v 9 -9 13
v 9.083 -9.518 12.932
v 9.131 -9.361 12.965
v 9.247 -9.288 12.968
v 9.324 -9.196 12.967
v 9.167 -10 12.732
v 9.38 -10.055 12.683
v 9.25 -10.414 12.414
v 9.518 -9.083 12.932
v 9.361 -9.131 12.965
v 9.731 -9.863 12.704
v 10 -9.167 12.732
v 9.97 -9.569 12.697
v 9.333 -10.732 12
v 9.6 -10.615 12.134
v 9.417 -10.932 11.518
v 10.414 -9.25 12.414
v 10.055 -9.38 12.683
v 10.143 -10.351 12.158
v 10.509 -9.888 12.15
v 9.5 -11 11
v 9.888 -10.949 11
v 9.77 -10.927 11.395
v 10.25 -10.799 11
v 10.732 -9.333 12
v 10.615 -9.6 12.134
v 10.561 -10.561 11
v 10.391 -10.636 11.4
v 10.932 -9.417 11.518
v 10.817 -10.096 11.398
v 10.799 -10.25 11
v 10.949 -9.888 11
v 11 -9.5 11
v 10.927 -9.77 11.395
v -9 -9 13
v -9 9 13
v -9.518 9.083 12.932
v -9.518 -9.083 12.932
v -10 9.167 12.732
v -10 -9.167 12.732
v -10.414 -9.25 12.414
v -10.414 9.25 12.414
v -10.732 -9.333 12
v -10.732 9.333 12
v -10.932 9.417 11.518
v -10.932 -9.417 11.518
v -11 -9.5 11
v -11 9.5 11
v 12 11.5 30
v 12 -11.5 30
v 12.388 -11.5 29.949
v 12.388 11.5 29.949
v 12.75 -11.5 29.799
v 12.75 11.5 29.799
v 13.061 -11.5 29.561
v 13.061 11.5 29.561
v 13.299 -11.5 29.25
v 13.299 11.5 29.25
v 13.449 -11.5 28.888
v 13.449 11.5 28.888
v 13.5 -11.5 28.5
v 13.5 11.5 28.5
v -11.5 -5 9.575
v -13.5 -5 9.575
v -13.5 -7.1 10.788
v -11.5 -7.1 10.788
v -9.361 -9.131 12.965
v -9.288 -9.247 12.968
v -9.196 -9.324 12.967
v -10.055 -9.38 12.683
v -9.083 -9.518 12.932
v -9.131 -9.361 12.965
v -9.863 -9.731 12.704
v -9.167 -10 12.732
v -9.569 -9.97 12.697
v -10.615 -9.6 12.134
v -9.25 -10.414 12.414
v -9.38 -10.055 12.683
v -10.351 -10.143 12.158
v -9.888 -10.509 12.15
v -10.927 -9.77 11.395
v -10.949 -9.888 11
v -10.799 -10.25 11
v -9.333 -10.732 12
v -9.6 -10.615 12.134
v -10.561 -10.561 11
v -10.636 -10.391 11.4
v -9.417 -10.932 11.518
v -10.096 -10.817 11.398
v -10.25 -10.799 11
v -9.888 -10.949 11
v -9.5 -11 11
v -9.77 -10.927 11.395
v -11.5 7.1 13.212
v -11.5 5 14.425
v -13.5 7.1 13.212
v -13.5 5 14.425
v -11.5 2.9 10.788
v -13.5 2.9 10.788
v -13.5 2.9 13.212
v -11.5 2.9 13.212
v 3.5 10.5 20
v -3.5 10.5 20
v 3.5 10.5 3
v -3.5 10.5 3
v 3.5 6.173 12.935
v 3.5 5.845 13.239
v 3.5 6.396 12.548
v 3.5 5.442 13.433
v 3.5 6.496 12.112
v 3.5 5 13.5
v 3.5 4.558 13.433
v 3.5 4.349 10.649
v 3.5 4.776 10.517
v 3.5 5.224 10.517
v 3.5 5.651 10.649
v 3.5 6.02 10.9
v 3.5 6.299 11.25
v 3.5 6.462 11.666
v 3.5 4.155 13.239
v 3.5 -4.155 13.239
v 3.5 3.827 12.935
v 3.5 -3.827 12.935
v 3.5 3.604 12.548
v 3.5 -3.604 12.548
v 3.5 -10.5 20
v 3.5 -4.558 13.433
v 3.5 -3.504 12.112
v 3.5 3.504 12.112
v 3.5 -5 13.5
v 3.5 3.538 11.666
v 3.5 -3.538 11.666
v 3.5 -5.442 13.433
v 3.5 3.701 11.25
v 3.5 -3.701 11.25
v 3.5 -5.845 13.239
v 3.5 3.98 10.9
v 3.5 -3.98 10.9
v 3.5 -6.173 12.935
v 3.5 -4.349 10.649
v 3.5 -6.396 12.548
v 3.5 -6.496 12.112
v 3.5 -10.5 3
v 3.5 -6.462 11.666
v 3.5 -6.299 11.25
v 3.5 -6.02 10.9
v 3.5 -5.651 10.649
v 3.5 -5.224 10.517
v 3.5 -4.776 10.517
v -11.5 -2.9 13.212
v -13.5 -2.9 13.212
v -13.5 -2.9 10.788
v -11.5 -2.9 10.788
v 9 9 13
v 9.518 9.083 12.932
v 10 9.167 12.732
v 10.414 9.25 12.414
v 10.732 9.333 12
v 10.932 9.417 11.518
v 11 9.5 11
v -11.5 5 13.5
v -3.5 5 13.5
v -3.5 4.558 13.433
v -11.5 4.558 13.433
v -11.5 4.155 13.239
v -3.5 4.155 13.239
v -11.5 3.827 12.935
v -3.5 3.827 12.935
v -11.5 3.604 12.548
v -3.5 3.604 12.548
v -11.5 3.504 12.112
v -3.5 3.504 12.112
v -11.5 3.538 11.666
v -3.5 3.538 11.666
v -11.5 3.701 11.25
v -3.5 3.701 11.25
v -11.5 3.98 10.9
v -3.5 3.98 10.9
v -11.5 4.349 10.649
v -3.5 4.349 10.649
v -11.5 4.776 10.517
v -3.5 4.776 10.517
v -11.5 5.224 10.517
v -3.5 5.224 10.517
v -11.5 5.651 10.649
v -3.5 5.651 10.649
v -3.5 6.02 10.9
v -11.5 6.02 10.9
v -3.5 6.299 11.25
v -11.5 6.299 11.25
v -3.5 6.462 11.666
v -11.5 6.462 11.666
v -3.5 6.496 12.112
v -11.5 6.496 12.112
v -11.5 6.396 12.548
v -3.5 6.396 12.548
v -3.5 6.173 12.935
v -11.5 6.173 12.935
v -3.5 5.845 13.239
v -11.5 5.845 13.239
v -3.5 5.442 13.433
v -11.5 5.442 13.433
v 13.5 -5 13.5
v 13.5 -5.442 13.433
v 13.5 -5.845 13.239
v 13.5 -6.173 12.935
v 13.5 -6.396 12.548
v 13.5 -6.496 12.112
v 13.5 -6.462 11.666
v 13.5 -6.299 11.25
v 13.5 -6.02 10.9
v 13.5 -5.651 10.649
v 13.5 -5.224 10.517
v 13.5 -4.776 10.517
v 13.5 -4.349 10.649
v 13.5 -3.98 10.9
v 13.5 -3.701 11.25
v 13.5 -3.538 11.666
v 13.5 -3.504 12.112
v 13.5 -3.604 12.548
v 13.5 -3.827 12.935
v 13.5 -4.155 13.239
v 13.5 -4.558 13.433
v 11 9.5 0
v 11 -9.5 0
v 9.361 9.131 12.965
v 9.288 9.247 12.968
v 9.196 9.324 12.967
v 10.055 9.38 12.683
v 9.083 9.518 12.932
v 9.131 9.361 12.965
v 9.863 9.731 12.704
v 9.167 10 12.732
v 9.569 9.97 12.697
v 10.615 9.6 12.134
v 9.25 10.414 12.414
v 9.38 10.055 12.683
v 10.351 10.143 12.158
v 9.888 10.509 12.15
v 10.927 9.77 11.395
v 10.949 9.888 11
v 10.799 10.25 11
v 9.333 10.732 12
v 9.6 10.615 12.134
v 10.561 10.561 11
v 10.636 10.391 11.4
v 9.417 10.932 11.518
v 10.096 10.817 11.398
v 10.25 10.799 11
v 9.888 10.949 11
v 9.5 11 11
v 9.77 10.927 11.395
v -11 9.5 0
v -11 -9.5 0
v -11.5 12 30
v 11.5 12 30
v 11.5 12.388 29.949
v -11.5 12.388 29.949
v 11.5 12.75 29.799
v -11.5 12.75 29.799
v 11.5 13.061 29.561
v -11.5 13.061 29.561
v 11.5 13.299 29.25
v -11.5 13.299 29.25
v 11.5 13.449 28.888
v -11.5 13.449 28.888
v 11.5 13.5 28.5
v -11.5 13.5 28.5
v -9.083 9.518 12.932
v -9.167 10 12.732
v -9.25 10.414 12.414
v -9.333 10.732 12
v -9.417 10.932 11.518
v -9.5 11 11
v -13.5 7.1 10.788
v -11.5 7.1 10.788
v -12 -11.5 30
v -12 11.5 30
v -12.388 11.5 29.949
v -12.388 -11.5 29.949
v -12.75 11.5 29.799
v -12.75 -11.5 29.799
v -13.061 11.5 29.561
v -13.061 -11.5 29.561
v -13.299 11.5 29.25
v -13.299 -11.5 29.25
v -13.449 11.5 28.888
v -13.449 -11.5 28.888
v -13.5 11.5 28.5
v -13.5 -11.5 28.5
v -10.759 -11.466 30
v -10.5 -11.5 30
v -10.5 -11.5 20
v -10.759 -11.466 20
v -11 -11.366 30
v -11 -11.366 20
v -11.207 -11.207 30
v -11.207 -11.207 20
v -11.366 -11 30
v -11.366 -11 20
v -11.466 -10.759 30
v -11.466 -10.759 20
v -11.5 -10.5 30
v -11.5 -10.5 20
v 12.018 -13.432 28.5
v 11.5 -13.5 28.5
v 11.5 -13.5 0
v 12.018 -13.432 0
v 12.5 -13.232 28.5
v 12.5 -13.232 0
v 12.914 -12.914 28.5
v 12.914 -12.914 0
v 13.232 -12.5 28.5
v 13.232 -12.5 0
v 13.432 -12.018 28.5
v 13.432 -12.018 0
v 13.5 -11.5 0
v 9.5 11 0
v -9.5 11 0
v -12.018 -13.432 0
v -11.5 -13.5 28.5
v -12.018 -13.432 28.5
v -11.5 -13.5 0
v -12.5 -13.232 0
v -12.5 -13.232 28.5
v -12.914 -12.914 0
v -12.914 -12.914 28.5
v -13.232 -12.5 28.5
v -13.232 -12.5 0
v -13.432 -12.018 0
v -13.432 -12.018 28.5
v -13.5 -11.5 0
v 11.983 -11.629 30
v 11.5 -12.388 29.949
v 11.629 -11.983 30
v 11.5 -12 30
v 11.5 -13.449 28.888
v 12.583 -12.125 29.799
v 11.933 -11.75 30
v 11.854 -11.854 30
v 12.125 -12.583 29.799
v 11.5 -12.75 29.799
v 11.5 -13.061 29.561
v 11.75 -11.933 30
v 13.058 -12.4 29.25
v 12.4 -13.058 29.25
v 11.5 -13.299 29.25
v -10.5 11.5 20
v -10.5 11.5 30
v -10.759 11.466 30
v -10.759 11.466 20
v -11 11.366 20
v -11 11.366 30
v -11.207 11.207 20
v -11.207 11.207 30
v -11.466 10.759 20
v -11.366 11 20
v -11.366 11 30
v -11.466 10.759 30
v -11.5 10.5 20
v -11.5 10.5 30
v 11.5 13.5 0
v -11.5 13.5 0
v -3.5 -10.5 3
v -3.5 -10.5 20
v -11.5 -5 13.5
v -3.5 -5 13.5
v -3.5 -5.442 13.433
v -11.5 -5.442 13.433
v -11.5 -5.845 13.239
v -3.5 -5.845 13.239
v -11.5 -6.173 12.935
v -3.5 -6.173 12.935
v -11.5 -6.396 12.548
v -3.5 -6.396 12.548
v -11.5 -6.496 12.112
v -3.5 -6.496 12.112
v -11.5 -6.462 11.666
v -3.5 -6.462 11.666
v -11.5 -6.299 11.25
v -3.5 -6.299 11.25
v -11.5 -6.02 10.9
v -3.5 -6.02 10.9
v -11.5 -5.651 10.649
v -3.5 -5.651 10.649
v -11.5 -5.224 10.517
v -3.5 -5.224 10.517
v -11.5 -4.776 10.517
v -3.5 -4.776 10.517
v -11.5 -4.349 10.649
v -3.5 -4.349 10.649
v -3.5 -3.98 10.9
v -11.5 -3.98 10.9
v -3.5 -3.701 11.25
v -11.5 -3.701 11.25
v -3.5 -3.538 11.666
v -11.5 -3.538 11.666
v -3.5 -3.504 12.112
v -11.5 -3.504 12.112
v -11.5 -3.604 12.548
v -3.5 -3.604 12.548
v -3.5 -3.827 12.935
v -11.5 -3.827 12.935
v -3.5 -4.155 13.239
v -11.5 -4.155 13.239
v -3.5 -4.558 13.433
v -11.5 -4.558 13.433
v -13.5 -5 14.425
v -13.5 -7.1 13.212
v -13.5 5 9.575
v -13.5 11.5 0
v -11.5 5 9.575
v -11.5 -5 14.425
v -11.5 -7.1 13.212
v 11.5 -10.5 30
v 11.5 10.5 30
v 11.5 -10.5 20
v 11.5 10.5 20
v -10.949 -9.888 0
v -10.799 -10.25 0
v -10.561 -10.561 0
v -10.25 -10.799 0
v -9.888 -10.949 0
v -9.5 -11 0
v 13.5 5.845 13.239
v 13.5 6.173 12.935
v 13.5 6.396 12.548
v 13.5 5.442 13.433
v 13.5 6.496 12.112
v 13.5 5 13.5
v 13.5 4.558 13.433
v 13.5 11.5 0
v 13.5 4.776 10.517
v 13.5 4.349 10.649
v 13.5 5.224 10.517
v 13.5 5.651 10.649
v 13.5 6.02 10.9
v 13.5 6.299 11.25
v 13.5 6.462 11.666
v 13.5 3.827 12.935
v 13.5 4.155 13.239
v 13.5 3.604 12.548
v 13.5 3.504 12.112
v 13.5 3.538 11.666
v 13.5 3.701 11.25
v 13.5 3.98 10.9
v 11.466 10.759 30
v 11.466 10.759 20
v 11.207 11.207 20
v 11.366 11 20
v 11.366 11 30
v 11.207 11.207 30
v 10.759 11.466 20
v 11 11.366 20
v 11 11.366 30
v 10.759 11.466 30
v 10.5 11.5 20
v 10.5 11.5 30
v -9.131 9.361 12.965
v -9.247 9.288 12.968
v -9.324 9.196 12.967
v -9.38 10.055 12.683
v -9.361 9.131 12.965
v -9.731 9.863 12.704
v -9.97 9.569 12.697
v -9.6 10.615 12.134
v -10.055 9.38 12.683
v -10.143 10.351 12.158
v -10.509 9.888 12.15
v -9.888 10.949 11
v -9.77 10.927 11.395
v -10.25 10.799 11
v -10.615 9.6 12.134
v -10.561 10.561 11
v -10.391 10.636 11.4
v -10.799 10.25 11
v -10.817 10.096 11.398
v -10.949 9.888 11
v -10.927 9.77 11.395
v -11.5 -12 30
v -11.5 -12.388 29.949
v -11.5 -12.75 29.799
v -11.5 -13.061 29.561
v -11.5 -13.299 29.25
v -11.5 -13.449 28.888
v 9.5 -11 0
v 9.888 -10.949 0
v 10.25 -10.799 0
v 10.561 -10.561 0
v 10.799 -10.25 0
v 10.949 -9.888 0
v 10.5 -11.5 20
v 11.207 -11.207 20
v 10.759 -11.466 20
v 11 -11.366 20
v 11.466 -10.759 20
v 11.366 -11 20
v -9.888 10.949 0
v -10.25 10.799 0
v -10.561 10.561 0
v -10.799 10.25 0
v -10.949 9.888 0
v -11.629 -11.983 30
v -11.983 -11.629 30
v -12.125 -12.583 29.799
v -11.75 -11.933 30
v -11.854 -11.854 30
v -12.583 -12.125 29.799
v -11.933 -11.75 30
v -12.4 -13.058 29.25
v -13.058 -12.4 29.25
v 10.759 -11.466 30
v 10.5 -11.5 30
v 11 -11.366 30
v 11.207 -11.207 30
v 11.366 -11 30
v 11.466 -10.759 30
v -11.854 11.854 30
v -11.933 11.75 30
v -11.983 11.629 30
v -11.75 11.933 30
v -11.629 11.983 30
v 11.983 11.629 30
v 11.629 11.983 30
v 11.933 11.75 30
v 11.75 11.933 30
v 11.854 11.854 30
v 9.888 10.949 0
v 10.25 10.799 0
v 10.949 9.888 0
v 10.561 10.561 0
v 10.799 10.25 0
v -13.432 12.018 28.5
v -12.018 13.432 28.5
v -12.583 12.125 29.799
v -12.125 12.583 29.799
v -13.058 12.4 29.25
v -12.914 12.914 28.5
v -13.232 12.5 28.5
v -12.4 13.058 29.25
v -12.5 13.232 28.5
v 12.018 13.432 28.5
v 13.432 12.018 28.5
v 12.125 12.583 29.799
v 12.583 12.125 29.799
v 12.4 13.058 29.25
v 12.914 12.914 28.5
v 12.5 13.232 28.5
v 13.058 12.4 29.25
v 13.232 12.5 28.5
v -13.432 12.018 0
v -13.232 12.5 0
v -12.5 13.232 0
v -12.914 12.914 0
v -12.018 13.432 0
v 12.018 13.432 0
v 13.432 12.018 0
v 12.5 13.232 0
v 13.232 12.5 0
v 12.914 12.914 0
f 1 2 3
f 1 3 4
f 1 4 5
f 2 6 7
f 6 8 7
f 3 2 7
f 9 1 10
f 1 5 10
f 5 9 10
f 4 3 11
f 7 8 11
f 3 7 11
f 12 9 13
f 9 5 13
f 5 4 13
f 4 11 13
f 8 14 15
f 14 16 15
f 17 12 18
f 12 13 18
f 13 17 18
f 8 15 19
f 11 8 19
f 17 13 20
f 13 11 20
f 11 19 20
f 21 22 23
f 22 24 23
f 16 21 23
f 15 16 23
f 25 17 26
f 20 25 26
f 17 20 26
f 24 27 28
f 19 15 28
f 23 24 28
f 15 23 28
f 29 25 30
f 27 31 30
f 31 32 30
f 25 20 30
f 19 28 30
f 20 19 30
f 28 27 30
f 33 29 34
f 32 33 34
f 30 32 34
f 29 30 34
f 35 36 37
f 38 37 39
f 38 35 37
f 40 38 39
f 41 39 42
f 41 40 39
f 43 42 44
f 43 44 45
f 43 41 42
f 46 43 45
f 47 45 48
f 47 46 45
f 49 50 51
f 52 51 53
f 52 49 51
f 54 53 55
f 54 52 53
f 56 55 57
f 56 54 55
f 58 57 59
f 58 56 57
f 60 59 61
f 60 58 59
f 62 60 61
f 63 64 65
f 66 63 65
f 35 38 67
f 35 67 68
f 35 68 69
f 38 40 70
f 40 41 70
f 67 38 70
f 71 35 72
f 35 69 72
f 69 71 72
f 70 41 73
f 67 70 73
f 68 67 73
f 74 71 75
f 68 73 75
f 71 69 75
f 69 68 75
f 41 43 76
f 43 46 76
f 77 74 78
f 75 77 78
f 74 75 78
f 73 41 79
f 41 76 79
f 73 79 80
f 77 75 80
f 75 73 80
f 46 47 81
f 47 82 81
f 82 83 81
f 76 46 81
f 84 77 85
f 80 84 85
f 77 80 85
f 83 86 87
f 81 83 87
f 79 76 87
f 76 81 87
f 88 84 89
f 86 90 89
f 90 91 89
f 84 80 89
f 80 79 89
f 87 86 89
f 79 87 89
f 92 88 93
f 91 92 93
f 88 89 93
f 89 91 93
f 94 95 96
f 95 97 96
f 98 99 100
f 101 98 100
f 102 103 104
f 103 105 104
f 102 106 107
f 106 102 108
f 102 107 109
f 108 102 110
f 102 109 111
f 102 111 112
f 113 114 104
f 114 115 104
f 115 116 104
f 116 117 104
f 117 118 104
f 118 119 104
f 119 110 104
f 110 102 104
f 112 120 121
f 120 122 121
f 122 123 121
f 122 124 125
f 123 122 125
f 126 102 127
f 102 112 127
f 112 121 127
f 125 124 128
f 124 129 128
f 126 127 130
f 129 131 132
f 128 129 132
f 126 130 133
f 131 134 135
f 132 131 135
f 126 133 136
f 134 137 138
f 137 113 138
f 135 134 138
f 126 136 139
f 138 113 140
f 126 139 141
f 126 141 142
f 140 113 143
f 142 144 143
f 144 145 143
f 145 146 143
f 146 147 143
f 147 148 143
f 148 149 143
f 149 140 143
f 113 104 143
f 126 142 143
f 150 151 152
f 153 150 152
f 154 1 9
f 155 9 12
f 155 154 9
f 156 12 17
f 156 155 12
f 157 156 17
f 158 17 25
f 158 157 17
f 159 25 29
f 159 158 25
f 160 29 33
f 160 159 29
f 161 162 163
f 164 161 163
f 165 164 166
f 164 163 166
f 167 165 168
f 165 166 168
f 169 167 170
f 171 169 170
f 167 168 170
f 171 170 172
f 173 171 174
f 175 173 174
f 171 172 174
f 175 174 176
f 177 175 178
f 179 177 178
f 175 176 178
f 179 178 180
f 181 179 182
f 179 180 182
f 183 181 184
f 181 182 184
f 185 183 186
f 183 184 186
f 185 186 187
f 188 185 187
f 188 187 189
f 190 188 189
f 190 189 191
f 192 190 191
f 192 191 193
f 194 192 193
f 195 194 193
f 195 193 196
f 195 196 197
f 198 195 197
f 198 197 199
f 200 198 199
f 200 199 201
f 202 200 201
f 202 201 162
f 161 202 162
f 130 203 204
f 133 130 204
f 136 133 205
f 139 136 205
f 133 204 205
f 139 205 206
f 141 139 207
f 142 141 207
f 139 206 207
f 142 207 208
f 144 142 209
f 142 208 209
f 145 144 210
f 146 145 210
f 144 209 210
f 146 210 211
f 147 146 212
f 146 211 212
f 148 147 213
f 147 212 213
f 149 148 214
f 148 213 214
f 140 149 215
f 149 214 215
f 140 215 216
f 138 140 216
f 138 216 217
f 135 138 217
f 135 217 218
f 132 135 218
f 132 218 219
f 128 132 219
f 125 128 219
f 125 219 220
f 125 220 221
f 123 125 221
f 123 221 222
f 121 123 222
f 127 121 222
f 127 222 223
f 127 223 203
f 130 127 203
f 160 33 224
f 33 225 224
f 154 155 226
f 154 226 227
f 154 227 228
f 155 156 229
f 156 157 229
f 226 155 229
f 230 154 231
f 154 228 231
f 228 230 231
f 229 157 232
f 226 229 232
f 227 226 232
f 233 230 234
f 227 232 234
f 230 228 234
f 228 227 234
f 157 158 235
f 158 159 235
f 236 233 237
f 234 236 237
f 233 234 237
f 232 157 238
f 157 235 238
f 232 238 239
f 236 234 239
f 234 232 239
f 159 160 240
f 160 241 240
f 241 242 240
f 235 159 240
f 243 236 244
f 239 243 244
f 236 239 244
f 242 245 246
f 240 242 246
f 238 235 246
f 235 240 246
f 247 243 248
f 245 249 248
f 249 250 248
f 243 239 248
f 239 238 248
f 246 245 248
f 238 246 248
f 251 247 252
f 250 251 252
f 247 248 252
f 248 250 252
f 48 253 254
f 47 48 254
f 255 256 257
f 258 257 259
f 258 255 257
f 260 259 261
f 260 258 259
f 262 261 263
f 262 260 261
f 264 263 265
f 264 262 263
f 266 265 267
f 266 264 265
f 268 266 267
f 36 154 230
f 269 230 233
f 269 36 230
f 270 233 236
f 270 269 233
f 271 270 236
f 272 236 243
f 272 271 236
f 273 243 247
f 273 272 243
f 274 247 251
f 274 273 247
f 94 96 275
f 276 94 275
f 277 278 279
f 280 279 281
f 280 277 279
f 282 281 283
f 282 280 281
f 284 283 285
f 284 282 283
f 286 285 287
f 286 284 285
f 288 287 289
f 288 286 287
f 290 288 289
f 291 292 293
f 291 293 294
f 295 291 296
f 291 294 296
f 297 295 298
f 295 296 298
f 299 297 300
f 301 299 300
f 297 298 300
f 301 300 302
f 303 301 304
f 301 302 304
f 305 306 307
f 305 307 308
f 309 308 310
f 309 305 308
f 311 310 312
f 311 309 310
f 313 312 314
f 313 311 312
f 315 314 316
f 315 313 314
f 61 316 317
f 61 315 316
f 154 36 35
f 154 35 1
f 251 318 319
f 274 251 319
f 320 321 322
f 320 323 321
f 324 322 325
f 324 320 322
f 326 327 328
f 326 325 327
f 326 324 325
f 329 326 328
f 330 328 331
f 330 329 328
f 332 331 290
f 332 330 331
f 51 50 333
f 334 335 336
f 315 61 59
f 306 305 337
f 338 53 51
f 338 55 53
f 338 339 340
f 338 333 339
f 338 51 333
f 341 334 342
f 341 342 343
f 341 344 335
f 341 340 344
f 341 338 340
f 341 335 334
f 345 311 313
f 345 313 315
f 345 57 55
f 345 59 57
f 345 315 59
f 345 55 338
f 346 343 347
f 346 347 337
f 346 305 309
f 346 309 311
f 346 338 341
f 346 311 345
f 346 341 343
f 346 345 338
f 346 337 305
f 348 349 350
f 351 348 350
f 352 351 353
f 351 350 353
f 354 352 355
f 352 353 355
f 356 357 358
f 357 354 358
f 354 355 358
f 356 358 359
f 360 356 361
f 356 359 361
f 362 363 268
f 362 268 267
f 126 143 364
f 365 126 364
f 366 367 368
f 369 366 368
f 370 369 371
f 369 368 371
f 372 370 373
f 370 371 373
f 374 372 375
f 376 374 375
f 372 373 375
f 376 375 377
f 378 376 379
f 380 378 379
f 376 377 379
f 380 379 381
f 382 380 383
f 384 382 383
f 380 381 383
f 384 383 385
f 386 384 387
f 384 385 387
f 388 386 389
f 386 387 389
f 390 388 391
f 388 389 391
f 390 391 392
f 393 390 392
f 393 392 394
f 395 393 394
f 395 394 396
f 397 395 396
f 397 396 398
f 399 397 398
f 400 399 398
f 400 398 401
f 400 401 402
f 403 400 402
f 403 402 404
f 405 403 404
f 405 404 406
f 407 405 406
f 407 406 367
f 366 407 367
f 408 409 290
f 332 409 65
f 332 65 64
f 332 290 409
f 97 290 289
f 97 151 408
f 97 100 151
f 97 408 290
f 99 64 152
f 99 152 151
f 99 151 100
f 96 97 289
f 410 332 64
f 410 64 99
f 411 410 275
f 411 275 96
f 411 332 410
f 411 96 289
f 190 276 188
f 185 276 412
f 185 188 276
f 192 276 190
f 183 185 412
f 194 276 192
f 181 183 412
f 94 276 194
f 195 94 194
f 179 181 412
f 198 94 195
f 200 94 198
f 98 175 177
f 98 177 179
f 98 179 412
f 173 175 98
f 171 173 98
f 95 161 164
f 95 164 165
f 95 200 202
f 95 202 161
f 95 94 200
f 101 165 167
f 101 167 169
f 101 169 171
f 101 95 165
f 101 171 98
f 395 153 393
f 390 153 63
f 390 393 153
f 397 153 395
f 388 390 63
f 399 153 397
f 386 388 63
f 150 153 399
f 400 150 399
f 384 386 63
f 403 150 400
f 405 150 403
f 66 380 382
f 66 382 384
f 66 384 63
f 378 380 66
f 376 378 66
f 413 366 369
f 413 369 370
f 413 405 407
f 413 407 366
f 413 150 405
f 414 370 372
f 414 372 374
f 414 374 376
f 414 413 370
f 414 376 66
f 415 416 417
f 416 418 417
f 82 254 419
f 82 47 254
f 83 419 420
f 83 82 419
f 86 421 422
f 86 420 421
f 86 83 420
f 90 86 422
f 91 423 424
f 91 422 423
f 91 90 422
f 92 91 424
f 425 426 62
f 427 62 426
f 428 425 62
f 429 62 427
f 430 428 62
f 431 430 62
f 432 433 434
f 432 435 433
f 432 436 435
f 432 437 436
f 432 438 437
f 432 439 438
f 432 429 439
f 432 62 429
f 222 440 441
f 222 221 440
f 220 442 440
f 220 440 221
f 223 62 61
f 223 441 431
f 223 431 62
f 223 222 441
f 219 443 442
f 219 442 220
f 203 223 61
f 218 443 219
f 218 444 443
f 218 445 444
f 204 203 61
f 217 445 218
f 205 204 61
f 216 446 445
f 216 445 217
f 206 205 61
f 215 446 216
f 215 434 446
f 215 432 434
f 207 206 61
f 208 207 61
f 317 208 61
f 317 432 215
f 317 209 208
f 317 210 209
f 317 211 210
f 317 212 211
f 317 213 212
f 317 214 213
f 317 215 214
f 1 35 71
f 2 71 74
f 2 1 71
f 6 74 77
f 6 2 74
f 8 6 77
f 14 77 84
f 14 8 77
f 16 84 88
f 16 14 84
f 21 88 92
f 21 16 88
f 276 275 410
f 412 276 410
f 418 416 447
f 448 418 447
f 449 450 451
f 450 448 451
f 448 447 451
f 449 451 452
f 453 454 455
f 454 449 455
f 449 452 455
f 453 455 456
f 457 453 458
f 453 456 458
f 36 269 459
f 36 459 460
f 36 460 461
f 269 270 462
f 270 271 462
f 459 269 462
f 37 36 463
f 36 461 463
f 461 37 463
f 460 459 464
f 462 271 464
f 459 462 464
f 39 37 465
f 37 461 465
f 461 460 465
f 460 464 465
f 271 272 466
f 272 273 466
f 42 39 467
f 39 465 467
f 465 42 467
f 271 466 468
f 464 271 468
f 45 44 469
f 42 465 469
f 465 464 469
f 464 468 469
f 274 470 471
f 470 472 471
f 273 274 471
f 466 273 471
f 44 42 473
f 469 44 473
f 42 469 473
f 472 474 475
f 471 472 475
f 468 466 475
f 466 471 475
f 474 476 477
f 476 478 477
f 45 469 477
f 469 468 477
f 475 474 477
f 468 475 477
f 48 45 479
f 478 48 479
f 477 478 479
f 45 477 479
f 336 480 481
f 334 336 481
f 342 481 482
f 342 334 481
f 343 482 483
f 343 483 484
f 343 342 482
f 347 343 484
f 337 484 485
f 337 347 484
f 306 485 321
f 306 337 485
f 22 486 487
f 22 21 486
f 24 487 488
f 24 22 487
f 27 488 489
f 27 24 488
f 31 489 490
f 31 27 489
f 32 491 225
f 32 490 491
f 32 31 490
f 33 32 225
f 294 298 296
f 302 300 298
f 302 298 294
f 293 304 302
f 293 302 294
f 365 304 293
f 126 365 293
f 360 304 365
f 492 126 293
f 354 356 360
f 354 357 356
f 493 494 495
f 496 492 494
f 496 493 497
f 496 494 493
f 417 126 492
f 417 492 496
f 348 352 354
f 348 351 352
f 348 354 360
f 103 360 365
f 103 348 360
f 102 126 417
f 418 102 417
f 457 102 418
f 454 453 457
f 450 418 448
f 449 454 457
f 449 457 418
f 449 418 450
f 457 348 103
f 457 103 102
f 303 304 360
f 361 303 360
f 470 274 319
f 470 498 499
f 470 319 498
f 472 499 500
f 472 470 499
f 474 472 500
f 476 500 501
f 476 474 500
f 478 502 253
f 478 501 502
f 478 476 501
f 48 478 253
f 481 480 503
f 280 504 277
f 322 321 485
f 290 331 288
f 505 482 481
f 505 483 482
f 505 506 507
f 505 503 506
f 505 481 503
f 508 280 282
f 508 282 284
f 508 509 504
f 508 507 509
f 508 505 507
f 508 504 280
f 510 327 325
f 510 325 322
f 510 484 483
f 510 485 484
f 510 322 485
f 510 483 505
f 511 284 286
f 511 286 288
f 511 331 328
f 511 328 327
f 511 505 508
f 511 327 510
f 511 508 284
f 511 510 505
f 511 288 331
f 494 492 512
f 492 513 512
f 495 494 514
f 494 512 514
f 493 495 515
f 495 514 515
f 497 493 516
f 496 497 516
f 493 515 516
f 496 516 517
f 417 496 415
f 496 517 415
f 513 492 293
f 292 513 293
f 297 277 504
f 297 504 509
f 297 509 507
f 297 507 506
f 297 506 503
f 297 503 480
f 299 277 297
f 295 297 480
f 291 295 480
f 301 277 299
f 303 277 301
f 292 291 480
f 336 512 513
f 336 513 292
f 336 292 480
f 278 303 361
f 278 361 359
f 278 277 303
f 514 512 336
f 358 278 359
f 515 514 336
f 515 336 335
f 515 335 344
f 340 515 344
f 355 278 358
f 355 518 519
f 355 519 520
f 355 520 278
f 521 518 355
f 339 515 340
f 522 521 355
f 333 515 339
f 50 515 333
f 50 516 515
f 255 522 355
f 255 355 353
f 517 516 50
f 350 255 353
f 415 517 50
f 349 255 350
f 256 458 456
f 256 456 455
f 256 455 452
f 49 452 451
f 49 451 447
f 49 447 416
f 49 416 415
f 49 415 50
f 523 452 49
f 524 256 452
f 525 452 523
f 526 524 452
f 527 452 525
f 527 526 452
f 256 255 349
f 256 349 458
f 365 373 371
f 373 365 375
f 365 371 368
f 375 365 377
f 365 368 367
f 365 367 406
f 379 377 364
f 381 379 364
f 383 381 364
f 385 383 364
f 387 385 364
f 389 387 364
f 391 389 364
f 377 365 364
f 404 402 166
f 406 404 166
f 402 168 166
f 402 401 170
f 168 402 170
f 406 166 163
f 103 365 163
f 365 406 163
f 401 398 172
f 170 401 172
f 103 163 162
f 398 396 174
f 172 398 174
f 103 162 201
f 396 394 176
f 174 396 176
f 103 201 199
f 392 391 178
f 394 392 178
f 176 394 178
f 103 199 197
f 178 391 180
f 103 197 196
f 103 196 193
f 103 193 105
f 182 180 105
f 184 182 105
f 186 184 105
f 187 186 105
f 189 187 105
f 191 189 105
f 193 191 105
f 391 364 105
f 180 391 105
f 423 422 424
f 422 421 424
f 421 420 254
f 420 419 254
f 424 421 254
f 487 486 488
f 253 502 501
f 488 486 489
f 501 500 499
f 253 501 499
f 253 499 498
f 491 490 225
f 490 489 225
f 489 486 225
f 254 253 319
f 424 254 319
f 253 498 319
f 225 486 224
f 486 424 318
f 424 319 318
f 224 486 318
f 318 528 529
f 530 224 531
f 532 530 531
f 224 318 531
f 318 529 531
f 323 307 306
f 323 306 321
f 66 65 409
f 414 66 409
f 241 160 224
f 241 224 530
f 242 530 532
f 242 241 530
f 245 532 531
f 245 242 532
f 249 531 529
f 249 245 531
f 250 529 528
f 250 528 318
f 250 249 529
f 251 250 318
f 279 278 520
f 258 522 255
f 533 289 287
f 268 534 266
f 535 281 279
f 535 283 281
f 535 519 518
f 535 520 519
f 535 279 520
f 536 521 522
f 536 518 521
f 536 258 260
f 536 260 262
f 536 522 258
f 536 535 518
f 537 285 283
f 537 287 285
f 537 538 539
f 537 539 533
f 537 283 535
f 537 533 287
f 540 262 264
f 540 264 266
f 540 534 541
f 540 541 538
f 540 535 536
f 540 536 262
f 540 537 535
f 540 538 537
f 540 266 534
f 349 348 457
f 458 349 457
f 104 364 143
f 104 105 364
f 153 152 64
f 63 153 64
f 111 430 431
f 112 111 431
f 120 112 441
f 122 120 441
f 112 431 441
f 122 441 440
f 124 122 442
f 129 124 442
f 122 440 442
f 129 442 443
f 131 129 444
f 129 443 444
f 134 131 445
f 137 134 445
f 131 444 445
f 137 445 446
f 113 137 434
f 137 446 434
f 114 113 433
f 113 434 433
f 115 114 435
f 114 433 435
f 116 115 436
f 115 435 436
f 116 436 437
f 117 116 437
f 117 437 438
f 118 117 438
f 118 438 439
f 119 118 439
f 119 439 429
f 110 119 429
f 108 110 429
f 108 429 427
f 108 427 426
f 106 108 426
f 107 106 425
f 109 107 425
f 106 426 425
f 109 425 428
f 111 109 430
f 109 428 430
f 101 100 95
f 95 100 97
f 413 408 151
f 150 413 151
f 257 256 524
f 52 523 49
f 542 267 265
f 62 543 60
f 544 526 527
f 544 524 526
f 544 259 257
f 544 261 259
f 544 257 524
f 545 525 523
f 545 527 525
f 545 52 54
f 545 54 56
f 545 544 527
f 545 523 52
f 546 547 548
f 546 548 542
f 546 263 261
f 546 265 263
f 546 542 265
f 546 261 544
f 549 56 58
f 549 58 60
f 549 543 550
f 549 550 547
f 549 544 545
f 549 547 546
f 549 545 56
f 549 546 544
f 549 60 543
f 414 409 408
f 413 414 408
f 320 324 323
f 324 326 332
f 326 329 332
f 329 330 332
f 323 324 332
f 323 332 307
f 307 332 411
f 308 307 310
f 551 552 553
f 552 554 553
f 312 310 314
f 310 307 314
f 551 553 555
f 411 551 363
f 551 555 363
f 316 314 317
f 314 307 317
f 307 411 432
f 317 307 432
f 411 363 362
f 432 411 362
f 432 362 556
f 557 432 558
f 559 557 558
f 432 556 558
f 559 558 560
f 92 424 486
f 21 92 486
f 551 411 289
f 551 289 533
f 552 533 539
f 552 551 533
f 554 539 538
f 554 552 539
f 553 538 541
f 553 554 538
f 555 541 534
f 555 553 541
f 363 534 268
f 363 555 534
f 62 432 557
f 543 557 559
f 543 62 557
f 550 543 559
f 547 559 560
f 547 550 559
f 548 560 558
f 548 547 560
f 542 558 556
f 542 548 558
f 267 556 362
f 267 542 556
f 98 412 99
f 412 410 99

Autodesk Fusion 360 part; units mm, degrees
sketch "Sketch1" plane through (0, 0, 0) normal (0, 0, 1) x (1, 0, 0)
  line L0 (12.5, -12.5) -> (-12.5, -12.5)
  line L1 (-12.5, -12.5) -> (-12.5, 12.5)
  line L2 (-12.5, 12.5) -> (12.5, 12.5)
  line L3 (12.5, 12.5) -> (12.5, -12.5)
  line L4 (12.5, -12.5) -> (-12.5, 12.5) construction
  line L5 (-12.5, -12.5) -> (12.5, 12.5) construction
  line L6 (3.5, -10.5) -> (-3.5, -10.5)
  line L7 (-3.5, -10.5) -> (-3.5, 10.5)
  line L8 (-3.5, 10.5) -> (3.5, 10.5)
  line L9 (3.5, 10.5) -> (3.5, -10.5)
  line L10 (3.5, -10.5) -> (-3.5, 10.5) construction
  line L11 (-3.5, -10.5) -> (3.5, 10.5) construction
  line L12 (11.5, -11.5) -> (-11.5, -11.5)
  line L13 (-11.5, -11.5) -> (-11.5, 11.5)
  line L14 (-11.5, 11.5) -> (11.5, 11.5)
  line L15 (11.5, 11.5) -> (11.5, -11.5)
  line L16 (11.5, -11.5) -> (-11.5, 11.5) construction
  line L17 (-11.5, -11.5) -> (11.5, 11.5) construction
  dimension "d1" = 25
  dimension "d2" = 25
  dimension "d3" = 7
  dimension "d4" = 21
  dimension "d5" = 23
  dimension "d6" = 23
extrude "Extrude1" add sketch "Sketch1" along normal blind 30 contours L0 L1 L2 L3 | L6 L7 L8 L9 | L12 L13 L14 L15 makes body 1
extrude "Extrude2" cut sketch "Sketch1" along normal blind 1000 from surface at 5 contours L6 L7 L8 L9 bodies 1
extrude "Extrude3" cut sketch "Sketch1" along normal blind 100 from surface at 20 contours L12 L13 L14 L15 bodies 1
sketch "Sketch2" plane through (-12.5, 0, 0) normal (-1, 0, 0) x (0, -1, 0)
  line L0 (-12.5, 0) -> (12.5, 0)
  line L1 (12.5, 0) -> (12.5, 30)
  line L2 (12.5, 30) -> (-12.5, 30)
  line L3 (-12.5, 30) -> (-12.5, 0)
  line L4 (0, 12) -> (5, 12)
  line L5 (0, 12) -> (-5, 12)
  line L6 (-2.9, 13.2124) -> (-5, 14.4249)
  line L7 (-5, 14.4249) -> (-7.1, 13.2124)
  line L8 (-7.1, 13.2124) -> (-7.1, 10.7876)
  line L9 (-7.1, 10.7876) -> (-5, 9.5751)
  line L10 (-5, 9.5751) -> (-2.9, 10.7876)
  line L11 (-2.9, 10.7876) -> (-2.9, 13.2124)
  line L12 (7.1, 13.2124) -> (5, 14.4249)
  line L13 (5, 14.4249) -> (2.9, 13.2124)
  line L14 (2.9, 13.2124) -> (2.9, 10.7876)
  line L15 (2.9, 10.7876) -> (5, 9.5751)
  line L16 (5, 9.5751) -> (7.1, 10.7876)
  line L17 (7.1, 10.7876) -> (7.1, 13.2124)
  point P0 (-5, 12)
  point P1 (5, 12)
  dimension "d17" = 12
  dimension "d18" = 5
  dimension "d22" = 2.1
  dimension "d23" = 2.1
extrude "Extrude4" cut 1 faces at (1.1667, -3.5, 5) along direction (0, 0, -1) blind 2 on bodies 1 bodies 1
hole "Hole1" at (-12.5, -5, 12) at (-12.5, 5, 12) direction (1, 0, 0) diameter 3 depth 100 tip angle 118 bodies 1
extrude "Extrude5" cut sketch "Sketch2" against normal blind 1 contours L6 L7 L8 L9 L10 L11 | L12 L13 L14 L15 L16 L17 bodies 1
move_face "OffsetFaces1" offset 1 3 faces at (12.5, -1.5193, 24.4778) (-4.1667, 12.5, 20) (4.1667, -12.5, 20) on bodies 1
move_face "OffsetFaces2" offset 1 1 faces at (-12.5, 1.6667, 24.8083) on bodies 1
fillet "Fillet1" radius 2 4 edges at (-13.5, -13.5, 15) (13.5, -13.5, 15) (13.5, 13.5, 15) (-13.5, 13.5, 15) on bodies 1
fillet "Fillet2" radius 1 4 edges at (11.5, -11.5, 25) (11.5, 11.5, 25) (-11.5, 11.5, 25) (-11.5, -11.5, 25) on bodies 1
fillet "Fillet3" radius 1.5 8 edges at (12.9142, -12.9142, 30) (13.5, 0, 30) (12.9142, 12.9142, 30) (0, 13.5, 30) (-12.9142, 12.9142, 30) (-13.5, 0, 30) (-12.9142, -12.9142, 30) (0, -13.5, 30) on bodies 1
copy_body "Body->Comp1" bodies 1 removing the originals makes body 2 in component "Box1"
sketch "Sketch3" plane through (0, 0, 0) normal (0, 0, 1) x (1, 0, 0)
  line L0 (11, 11) -> (-11, 11)
  line L1 (-11, 11) -> (-11, -11)
  line L2 (-11, -11) -> (11, -11)
  line L3 (11, -11) -> (11, 11)
  line L4 (11, 11) -> (-11, -11) construction
  line L5 (-11, 11) -> (11, -11) construction
  dimension "d34" = 22
  dimension "d35" = 22
extrude "Extrude6" add sketch "Sketch3" along normal blind 13 separate body makes body 3
fillet "Fillet4" radius 1.5 4 edges at (11, -11, 6.5) (11, 11, 6.5) (-11, 11, 6.5) (-11, -11, 6.5) on bodies 3
fillet "Fillet5" radius 2 8 edges at (-11, 0, 13) (-10.5607, 10.5607, 13) (0, 11, 13) (10.5607, 10.5607, 13) (11, 0, 13) (10.5607, -10.5607, 13) (0, -11, 13) (-10.5607, -10.5607, 13) on bodies 3
copy_body "Body->Comp2" bodies 3 removing the originals makes body 4 in component "Plunger"
component "Box1" placed x (1, 0, 0) y (0, 1, 0) z (0, 0, 1) at (0, 0, 0)
component "Plunger" placed x (1, 0, 0) y (0, 1, 0) z (0, 0, 1) at (0, 0, 0)
